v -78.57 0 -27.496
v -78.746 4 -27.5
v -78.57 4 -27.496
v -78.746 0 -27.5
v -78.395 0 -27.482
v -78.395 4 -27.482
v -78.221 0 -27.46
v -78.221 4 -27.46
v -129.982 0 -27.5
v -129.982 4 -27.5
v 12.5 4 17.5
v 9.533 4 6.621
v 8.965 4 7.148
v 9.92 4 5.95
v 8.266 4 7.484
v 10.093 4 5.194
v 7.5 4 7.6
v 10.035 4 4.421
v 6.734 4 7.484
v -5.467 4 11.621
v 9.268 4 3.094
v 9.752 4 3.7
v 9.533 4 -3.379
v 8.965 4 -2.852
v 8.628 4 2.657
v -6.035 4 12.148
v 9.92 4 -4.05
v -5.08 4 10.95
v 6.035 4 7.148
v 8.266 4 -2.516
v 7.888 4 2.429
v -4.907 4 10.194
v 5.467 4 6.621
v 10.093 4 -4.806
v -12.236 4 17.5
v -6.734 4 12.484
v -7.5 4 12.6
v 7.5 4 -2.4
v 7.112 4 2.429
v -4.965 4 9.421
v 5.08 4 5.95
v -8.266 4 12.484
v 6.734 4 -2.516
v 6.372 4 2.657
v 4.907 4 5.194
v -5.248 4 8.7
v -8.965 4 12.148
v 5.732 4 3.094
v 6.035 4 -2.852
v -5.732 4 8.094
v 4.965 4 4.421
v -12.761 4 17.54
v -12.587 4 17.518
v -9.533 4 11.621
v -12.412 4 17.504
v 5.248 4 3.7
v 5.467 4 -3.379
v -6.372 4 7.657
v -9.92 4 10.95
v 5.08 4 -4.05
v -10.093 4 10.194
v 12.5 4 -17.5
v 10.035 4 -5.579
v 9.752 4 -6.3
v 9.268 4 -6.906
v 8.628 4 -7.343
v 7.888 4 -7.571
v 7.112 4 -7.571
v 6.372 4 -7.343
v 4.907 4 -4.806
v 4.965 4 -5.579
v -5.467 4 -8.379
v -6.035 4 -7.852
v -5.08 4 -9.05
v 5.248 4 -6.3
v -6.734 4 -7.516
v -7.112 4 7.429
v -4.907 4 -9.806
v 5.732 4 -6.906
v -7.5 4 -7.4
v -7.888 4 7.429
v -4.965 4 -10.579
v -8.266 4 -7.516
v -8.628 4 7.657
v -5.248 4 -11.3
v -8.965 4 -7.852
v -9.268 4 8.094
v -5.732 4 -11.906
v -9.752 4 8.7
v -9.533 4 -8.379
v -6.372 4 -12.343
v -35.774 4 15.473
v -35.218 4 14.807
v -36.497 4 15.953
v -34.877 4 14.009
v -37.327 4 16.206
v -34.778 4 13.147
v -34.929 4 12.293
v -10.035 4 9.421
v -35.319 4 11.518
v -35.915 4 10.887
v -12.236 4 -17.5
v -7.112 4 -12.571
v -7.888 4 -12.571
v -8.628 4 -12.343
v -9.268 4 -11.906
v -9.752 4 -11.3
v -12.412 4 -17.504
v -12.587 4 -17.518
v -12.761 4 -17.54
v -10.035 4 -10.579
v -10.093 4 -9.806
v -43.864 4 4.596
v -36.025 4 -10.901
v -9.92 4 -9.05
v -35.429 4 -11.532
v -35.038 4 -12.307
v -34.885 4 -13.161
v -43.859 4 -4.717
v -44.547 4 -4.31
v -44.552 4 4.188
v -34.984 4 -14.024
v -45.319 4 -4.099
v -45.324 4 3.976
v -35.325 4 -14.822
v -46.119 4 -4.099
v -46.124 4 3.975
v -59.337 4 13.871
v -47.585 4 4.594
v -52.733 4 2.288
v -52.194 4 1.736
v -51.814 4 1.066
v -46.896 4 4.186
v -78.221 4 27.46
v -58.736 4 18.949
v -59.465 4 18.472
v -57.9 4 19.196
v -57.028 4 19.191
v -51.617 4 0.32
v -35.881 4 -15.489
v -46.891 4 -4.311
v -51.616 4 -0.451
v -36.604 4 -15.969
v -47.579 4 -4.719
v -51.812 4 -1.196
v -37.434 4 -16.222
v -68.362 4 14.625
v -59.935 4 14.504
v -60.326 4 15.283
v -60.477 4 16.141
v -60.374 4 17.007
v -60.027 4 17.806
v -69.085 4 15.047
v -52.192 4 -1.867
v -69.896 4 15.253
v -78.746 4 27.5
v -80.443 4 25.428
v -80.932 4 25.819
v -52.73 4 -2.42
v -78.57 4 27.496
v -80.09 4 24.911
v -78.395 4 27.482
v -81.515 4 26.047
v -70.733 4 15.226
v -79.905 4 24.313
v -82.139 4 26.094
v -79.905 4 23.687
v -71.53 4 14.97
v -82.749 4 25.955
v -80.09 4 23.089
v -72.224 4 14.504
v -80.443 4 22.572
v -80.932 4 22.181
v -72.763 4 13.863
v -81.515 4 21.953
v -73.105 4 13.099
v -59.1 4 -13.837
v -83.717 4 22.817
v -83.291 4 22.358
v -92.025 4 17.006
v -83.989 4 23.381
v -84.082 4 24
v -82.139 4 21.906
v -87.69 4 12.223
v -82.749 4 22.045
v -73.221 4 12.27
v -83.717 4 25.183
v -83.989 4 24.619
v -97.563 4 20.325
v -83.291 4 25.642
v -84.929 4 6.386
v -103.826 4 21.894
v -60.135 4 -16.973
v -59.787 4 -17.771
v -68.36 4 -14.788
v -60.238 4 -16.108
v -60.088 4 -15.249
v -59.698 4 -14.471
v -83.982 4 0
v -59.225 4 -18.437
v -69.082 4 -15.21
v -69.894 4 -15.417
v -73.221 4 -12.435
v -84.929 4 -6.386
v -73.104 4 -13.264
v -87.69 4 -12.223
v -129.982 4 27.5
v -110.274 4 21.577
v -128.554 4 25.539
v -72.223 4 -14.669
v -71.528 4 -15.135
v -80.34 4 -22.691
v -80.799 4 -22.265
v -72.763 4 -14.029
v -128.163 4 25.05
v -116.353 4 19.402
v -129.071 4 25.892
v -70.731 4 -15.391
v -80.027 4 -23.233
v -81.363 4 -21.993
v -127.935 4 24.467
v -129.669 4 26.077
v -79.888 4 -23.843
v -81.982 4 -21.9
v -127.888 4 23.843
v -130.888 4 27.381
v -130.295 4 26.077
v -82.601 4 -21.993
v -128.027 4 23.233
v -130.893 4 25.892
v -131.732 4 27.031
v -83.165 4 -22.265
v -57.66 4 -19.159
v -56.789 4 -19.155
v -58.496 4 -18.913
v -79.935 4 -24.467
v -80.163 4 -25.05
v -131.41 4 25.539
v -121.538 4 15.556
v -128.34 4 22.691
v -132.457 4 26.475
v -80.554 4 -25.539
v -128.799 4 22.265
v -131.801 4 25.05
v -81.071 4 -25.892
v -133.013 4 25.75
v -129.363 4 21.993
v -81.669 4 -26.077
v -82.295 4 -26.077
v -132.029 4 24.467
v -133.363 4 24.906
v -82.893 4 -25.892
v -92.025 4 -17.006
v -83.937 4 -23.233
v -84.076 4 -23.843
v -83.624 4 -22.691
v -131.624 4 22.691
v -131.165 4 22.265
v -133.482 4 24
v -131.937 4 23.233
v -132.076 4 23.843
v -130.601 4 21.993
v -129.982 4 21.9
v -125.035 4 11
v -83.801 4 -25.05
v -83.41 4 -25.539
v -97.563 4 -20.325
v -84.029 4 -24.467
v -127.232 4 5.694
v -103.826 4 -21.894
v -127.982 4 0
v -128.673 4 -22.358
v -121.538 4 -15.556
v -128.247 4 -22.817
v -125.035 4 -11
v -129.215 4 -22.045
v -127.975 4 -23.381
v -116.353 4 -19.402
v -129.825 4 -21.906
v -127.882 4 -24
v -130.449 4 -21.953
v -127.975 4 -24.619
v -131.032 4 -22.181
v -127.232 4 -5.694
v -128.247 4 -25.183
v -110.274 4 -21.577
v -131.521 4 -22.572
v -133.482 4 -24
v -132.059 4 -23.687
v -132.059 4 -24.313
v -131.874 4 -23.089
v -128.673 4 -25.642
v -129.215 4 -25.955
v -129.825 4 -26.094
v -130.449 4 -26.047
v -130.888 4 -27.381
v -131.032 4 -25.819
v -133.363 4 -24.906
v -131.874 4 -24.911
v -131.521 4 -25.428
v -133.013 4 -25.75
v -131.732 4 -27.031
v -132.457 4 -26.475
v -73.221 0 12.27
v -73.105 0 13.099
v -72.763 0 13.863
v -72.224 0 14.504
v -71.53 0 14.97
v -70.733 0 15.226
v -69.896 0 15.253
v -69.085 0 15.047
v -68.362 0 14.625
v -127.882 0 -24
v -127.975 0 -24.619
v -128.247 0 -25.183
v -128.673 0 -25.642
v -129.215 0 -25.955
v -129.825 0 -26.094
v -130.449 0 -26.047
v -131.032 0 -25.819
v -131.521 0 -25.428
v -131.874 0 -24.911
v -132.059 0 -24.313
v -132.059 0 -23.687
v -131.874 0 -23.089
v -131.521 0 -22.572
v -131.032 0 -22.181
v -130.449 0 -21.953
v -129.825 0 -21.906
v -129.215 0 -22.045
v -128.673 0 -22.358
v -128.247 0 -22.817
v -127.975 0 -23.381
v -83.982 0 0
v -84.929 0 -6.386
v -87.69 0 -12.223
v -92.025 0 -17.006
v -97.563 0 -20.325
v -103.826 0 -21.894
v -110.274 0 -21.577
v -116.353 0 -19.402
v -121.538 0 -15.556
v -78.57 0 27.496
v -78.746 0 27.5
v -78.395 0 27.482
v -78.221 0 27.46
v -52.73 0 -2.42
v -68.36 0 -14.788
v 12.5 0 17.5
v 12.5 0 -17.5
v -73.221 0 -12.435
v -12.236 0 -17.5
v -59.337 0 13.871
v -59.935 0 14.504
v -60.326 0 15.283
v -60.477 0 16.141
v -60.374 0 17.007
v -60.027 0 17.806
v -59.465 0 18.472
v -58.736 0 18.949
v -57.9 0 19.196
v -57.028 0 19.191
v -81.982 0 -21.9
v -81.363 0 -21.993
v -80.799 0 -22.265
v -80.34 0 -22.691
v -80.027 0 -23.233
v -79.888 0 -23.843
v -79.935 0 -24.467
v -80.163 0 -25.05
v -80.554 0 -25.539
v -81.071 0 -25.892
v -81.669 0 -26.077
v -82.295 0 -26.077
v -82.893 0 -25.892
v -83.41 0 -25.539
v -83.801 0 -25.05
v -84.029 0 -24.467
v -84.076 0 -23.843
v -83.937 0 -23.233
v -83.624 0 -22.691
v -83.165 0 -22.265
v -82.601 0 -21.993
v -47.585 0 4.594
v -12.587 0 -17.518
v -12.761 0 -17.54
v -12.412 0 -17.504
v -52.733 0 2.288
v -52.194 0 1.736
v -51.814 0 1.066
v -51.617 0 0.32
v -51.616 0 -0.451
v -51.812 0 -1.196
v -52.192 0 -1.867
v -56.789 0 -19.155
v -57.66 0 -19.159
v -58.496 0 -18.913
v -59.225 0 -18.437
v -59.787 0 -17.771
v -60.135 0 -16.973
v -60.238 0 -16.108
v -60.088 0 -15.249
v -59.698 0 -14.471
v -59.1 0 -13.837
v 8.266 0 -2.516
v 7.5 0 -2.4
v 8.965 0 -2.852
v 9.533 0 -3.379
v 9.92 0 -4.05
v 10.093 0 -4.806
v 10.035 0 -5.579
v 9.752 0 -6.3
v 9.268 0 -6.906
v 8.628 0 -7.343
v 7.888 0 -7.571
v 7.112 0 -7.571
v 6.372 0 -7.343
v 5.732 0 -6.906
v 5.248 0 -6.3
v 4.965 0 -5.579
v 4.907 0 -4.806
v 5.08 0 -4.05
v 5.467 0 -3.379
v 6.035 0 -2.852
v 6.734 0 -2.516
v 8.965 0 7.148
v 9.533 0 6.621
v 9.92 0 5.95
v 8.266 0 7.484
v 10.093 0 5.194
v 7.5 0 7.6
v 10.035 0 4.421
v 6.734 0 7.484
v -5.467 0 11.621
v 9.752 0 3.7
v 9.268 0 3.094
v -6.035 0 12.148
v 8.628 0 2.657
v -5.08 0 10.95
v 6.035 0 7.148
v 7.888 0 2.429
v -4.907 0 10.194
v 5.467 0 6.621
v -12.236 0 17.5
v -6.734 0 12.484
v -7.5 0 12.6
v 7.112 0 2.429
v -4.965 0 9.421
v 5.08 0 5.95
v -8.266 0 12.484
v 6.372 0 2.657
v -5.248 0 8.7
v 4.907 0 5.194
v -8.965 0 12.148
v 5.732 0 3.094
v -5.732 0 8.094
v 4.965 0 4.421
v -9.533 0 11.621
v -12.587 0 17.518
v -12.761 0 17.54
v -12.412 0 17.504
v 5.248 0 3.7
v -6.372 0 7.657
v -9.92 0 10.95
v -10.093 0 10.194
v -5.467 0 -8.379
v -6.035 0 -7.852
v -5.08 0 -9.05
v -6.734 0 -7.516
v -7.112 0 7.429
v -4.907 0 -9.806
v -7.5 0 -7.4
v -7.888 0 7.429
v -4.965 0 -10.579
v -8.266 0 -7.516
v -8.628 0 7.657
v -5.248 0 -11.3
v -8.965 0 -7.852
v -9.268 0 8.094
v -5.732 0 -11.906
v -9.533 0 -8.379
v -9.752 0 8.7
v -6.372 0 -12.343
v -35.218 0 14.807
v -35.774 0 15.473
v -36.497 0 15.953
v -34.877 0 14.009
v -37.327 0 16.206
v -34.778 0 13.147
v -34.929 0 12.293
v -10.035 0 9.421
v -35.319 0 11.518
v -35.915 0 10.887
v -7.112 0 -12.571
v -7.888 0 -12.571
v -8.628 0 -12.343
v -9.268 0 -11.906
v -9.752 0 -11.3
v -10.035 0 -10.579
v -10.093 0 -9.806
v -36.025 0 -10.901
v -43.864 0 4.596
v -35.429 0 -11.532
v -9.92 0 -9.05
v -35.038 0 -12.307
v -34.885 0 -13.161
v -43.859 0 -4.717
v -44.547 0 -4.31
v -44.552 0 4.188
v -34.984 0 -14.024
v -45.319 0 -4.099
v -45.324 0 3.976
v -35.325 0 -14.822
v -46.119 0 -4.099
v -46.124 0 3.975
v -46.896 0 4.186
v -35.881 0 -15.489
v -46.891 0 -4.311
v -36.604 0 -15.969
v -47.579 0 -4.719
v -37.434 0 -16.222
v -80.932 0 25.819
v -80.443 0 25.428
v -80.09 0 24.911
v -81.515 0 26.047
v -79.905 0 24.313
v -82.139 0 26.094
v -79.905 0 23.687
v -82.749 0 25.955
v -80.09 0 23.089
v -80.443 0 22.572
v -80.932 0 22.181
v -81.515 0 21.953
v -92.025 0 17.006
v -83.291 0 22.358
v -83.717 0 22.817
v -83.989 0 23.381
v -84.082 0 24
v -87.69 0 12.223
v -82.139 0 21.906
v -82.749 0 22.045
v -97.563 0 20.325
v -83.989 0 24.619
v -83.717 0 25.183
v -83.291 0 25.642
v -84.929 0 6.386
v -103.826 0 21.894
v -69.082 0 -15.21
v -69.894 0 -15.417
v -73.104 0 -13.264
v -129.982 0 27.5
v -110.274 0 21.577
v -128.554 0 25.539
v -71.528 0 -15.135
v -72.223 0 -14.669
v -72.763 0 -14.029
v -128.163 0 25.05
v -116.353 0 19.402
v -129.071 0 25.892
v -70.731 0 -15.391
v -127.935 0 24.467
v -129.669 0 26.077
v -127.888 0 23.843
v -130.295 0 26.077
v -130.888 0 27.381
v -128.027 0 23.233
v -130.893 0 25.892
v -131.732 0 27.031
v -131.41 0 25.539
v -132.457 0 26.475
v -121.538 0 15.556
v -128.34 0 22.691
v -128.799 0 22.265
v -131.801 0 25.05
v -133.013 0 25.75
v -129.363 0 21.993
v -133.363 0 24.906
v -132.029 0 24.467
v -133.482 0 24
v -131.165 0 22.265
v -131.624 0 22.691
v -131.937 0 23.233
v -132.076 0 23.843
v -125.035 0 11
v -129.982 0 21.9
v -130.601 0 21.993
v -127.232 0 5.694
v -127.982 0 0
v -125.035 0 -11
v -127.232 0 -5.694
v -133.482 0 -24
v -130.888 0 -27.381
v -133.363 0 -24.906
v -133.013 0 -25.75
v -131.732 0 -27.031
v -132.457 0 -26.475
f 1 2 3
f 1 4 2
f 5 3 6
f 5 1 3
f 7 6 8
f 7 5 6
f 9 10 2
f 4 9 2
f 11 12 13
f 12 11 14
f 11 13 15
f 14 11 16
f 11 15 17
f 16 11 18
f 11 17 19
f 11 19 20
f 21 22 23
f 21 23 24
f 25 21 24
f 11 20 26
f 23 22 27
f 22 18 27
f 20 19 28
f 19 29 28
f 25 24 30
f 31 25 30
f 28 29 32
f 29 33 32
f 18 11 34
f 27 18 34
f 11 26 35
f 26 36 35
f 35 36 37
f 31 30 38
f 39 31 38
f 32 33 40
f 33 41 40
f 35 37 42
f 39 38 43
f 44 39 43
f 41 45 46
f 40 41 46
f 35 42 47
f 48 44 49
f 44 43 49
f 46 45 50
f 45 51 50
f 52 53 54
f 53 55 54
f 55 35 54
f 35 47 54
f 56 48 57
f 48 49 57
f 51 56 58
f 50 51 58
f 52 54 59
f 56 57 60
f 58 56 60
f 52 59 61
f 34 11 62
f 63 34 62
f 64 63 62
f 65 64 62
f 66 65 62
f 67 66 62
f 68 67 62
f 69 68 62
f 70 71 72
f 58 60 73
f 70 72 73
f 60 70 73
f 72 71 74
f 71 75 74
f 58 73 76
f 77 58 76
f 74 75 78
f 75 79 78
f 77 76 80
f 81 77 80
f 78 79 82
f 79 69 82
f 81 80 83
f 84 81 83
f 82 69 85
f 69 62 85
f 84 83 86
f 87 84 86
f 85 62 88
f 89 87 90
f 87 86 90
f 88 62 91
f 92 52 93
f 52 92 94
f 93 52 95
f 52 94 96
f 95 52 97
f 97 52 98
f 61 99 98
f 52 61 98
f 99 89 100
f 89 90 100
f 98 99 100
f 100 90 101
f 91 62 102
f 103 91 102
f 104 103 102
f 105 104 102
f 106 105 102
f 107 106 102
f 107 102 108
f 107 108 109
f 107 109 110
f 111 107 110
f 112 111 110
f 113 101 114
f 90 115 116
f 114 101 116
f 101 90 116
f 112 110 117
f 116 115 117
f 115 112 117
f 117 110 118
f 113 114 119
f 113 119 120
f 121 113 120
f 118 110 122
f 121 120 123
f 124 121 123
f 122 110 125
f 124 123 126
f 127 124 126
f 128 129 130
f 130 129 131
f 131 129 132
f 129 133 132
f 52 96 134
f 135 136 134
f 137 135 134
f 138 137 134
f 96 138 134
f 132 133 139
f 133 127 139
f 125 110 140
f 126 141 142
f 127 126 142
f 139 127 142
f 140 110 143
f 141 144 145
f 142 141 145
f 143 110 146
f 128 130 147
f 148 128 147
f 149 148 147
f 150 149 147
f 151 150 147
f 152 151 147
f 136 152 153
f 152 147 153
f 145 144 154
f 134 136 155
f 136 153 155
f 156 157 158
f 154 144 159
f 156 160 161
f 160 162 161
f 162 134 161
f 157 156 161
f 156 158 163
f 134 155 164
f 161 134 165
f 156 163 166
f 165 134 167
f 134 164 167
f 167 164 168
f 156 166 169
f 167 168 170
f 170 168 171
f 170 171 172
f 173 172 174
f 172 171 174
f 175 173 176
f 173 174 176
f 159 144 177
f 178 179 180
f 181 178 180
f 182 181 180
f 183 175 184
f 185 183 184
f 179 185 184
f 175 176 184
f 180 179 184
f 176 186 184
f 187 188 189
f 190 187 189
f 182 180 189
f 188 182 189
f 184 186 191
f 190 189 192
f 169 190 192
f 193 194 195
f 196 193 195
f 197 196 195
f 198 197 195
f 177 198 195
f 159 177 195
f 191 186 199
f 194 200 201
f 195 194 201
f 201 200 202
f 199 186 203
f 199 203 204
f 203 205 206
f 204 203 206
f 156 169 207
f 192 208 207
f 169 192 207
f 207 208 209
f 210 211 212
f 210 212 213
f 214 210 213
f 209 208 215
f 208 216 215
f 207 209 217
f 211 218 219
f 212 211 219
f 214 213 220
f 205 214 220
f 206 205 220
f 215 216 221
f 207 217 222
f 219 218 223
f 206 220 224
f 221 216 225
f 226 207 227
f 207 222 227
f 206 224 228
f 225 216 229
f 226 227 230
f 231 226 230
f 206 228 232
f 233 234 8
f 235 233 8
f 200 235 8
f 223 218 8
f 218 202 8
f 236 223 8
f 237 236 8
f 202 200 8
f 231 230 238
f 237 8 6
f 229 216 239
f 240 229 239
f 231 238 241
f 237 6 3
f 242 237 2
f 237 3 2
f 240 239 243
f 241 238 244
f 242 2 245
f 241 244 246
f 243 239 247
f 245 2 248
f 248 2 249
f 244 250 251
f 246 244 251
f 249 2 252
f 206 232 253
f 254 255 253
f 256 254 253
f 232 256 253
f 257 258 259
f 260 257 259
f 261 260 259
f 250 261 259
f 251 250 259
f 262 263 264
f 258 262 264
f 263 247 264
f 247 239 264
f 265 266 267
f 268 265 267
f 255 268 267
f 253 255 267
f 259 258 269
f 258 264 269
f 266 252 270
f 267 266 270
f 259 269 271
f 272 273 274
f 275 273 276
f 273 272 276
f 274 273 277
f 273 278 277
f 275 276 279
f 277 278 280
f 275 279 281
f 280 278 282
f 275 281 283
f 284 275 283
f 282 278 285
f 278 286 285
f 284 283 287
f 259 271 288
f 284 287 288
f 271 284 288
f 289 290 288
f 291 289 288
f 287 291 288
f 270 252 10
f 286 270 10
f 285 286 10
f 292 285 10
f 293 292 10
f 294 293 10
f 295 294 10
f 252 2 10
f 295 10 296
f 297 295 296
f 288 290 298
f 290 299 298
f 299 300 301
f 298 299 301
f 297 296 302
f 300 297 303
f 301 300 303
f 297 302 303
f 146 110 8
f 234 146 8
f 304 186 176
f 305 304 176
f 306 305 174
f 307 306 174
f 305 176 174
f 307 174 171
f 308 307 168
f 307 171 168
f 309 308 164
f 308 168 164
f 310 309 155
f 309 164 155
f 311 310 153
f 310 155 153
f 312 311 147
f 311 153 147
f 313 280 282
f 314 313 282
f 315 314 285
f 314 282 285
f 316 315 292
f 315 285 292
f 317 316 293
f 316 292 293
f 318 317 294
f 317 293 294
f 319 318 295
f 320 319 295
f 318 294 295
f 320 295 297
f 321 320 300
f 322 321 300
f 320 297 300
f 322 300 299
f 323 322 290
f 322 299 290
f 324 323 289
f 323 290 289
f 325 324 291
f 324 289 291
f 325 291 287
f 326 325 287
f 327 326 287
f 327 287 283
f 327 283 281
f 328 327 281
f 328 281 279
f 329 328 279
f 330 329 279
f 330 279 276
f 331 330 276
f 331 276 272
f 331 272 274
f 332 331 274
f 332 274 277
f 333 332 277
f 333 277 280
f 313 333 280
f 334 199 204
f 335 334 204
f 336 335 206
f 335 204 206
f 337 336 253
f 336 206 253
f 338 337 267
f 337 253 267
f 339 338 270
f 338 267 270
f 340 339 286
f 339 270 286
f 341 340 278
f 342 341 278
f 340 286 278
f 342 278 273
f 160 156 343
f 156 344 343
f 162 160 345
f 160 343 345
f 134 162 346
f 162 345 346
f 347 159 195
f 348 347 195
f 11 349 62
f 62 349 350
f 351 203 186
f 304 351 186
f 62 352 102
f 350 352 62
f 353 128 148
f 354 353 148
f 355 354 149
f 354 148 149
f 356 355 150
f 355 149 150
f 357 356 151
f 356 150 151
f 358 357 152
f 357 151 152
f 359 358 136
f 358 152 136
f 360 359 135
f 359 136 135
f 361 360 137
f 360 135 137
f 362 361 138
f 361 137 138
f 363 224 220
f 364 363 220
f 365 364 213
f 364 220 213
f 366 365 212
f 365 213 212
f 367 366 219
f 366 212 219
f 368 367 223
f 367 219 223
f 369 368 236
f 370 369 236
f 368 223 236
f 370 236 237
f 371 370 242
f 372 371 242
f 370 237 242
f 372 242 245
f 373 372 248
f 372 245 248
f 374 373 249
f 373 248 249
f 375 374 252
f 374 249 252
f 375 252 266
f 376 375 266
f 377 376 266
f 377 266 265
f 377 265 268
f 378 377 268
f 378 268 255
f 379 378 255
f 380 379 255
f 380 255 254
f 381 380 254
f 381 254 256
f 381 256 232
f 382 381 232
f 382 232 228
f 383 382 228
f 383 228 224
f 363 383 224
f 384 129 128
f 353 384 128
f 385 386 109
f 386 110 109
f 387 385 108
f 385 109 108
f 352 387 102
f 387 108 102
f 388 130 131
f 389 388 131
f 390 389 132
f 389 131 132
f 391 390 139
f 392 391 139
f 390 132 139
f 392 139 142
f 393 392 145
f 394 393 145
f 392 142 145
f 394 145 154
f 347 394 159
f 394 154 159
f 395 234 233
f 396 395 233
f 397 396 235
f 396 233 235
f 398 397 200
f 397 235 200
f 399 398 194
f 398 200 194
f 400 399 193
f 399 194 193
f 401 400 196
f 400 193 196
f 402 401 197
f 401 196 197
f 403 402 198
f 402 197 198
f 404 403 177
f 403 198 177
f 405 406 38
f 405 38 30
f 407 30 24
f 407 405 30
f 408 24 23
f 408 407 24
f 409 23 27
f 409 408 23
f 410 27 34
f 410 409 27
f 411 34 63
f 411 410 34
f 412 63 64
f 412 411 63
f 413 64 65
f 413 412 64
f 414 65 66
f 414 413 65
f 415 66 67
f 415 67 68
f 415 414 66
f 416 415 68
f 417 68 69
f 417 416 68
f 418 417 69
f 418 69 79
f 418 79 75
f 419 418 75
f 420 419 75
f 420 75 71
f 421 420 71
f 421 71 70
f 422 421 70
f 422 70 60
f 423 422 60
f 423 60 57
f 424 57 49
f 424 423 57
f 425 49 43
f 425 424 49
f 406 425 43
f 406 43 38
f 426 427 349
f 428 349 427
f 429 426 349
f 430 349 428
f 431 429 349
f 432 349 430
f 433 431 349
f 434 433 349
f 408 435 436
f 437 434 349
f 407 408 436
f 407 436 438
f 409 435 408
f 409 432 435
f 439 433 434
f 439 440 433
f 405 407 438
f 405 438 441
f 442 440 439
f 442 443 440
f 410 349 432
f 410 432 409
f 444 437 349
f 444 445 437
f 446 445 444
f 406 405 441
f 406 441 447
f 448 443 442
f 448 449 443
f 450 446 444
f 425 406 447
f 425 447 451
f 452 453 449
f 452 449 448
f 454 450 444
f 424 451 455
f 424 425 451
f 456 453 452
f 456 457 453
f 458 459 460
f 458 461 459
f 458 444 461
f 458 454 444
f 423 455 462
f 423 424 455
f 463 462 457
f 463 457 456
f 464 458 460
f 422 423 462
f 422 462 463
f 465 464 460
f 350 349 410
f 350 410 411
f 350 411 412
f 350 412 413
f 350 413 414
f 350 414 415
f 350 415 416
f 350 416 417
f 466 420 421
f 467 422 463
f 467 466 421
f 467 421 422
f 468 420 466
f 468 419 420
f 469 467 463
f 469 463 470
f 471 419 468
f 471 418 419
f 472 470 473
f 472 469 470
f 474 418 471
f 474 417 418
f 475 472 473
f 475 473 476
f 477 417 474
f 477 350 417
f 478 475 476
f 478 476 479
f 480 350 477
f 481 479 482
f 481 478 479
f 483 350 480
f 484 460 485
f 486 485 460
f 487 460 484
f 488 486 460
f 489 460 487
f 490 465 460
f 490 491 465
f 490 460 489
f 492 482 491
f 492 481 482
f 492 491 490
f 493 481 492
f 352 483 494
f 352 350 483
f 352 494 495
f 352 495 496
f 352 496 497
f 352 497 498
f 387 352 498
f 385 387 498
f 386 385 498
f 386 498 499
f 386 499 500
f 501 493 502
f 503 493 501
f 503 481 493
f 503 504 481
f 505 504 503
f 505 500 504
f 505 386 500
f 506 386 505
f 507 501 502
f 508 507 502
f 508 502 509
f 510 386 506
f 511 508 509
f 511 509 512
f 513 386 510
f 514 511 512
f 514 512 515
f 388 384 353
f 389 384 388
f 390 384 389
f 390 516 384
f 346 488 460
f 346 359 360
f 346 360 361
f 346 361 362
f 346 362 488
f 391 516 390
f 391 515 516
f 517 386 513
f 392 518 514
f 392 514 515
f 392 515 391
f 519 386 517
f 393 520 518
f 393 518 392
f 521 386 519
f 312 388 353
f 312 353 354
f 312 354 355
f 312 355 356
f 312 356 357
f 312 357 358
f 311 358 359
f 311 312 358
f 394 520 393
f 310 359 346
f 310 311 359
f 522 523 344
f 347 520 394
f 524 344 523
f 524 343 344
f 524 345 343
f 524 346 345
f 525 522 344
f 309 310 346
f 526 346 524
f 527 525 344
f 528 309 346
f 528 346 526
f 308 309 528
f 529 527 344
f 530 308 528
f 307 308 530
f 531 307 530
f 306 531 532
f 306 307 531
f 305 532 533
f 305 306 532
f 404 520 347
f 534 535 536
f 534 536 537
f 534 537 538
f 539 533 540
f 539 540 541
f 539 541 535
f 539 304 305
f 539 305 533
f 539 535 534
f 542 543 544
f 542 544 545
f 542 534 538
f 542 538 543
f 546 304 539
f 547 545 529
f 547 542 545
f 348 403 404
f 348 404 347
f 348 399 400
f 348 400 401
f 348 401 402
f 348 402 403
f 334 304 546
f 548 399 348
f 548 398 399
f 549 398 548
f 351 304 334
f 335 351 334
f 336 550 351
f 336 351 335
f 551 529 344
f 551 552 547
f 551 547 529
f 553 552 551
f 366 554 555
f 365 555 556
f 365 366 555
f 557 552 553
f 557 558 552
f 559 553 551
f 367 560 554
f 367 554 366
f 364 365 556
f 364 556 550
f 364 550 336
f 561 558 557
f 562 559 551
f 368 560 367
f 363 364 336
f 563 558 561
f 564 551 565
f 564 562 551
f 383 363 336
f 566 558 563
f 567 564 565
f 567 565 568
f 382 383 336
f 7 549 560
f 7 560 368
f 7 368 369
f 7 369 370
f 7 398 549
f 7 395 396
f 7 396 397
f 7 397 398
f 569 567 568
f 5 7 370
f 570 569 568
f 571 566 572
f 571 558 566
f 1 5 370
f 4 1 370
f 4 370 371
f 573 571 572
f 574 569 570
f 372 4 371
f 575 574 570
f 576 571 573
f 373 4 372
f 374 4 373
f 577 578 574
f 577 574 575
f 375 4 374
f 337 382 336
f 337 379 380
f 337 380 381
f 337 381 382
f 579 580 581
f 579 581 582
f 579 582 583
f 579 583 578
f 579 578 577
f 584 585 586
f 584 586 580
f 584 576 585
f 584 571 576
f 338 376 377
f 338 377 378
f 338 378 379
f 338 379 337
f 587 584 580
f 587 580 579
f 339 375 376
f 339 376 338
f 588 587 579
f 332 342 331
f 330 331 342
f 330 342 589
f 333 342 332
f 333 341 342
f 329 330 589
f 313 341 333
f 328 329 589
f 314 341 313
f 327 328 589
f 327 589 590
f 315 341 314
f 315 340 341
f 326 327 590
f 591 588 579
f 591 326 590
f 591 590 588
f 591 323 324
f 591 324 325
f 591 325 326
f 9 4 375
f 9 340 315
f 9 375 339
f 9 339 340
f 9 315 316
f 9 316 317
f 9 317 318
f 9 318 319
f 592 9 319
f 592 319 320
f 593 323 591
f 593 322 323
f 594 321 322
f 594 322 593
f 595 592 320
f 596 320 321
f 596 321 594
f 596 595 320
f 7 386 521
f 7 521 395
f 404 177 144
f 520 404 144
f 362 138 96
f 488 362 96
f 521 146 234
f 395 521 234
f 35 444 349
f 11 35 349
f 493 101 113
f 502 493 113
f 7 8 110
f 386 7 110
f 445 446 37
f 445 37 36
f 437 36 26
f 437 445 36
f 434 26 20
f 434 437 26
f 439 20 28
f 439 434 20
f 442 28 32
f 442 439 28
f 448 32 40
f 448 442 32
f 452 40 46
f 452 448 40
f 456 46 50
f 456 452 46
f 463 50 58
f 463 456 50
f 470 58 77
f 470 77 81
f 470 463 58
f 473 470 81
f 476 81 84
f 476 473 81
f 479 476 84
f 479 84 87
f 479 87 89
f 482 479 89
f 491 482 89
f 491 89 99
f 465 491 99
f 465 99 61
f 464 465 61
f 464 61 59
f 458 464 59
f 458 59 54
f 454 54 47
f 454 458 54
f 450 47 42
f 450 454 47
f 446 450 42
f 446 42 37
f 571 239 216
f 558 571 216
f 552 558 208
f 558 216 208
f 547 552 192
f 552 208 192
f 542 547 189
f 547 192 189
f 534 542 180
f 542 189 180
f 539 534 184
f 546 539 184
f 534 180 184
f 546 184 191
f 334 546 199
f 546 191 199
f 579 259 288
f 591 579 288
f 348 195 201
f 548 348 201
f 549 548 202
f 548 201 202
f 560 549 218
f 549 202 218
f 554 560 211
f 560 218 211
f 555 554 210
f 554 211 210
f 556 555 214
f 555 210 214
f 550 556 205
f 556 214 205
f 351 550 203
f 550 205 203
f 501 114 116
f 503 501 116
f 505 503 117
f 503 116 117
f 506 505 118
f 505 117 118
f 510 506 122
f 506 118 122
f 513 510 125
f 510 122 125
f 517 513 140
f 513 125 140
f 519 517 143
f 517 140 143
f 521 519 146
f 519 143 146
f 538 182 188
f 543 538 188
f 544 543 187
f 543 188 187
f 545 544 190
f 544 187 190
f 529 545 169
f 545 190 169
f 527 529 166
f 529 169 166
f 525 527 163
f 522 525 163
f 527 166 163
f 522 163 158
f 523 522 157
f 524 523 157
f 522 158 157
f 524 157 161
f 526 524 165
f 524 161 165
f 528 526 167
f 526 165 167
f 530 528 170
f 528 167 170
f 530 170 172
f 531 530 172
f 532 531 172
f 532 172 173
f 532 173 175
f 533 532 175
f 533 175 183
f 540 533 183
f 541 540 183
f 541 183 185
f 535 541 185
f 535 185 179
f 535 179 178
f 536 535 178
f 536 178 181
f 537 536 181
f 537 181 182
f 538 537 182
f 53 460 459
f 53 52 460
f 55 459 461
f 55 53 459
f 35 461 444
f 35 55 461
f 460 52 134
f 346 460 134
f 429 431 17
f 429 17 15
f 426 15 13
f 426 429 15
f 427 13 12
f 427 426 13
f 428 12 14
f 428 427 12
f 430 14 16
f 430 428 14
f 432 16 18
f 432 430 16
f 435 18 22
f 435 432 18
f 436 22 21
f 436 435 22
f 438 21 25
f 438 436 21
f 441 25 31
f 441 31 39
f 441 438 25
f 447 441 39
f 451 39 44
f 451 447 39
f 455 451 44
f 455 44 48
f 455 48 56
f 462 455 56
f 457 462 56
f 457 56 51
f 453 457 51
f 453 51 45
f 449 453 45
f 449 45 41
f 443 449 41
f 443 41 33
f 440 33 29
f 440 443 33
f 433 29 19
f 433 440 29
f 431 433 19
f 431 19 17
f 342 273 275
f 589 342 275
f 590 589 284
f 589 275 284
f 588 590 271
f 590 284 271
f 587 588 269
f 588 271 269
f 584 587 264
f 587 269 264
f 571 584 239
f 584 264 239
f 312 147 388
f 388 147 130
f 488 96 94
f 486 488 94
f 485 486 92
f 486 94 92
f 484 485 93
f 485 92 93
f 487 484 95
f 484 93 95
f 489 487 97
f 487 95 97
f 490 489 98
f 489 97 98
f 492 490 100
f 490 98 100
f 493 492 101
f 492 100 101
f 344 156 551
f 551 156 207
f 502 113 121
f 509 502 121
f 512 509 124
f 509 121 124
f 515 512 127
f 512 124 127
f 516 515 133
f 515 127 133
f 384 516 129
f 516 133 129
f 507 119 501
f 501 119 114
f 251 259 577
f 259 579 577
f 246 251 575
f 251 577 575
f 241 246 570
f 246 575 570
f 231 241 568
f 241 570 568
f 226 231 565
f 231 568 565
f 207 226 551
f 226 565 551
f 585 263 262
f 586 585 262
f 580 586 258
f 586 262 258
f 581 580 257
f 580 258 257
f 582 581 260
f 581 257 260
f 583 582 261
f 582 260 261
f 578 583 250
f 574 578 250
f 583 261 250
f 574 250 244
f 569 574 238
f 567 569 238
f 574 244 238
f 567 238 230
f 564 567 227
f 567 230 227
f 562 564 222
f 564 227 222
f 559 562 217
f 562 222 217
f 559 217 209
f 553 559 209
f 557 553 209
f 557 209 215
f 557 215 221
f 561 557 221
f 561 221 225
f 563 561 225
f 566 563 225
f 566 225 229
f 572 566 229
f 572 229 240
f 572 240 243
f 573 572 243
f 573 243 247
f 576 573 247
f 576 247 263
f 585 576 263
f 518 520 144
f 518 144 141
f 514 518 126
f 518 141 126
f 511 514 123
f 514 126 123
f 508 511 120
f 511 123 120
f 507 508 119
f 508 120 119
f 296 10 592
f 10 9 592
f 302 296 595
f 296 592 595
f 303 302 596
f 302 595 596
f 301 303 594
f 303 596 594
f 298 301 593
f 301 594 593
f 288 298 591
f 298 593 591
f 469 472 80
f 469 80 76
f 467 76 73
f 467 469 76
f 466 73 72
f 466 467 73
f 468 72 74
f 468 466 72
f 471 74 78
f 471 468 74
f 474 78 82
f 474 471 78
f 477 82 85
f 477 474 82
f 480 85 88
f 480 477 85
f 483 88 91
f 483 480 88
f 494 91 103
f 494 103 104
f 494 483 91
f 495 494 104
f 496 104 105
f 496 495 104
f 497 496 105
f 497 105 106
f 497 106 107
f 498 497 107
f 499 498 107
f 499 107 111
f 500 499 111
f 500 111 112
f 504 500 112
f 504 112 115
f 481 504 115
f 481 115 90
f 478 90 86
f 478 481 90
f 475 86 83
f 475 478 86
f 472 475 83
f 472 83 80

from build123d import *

# Parameters (mm, degrees)
SKETCH_1_W               = 25
SKETCH_1_H               = 35
SKETCH_1_R               = 2.6
EXTRUDE_1_DEPTH          = 4
EXTRUDE_2_DEPTH          = 4
FILLET_1_R               = 3.5
CUT_EXTRUDE_1_DEPTH      = 10
SKETCH_4_R               = 2.1
CUT_EXTRUDE_2_DEPTH      = 10
PATTERN_CIRCULAR_1_COUNT = 4
CUT_EXTRUDE_3_DEPTH      = 163


with BuildPart() as part:
    # 草图1 → 凸台-拉伸1 (new body)
    with BuildSketch(Plane(origin=(0, 0, 0), x_dir=(1, 0, 0), z_dir=(0, 1, 0))):
        Rectangle(SKETCH_1_W, SKETCH_1_H)
        with Locations(Location((7.5, 5, 0), (0, 0, 270))):
            Circle(SKETCH_1_R, mode=Mode.SUBTRACT)
        with Locations(Location((7.5, -5, 0), (0, 0, 270))):
            Circle(SKETCH_1_R, mode=Mode.SUBTRACT)
        with Locations(Location((-7.5, -10, 0), (0, 0, 270))):
            Circle(SKETCH_1_R, mode=Mode.SUBTRACT)
        with Locations(Location((-7.5, 10, 0), (0, 0, 270))):
            Circle(SKETCH_1_R, mode=Mode.SUBTRACT)
    extrude(amount=EXTRUDE_1_DEPTH)


with BuildPart() as body_2:
    # 草图2 → 凸台-拉伸2 (new body)
    with BuildSketch(Plane(origin=(0, 4, 0), x_dir=(1, 0, 0), z_dir=(0, 1, 0))):
        Polygon((-133.482, 27.5), (-78.482, 27.5), (-12.5, 17.5), (-12.5, -17.5), (-78.482, -27.5), (-133.482, -27.5), align=None)
    extrude(amount=-EXTRUDE_2_DEPTH)


with BuildPart() as part_1:
    add(part.part)

    # Combine 1: union body 2
    add(body_2.part)

    # 圆角1
    fillet_1_edges = [part_1.edges().sort_by_distance(p)[0] for p in [
        (-12.5, 2, -17.5),
        (-12.5, 2, 17.5),
        (-78.482, 2, 27.5),
        (-133.482, 2, 27.5),
        (-133.482, 2, -27.5),
        (-78.482, 2, -27.5),
    ]]
    fillet(fillet_1_edges, radius=FILLET_1_R)

    # 草图3 → 切除-拉伸1 (cut)
    with BuildSketch(Plane(origin=(0, 4, 0), x_dir=(1, 0, 0), z_dir=(0, 1, 0))):
        with BuildLine():
            ThreePointArc((-83.982, 0), (-97.562964488, 20.325349715), (-121.538349186, 15.556349186))
            Line((-121.538349186, 15.556349186), (-105.982, 0))
            Line((-105.982, 0), (-121.538349186, -15.556349186))
            ThreePointArc((-121.538349186, -15.556349186), (-97.562964488, -20.325349715), (-83.982, 0))
        make_face()
        with BuildLine():
            Line((-105.982, 0), (-121.538349186, 15.556349186))
            ThreePointArc((-121.538349186, 15.556349186), (-127.982, 0), (-121.538349186, -15.556349186))
            Line((-121.538349186, -15.556349186), (-105.982, 0))
        make_face()
    extrude(amount=-CUT_EXTRUDE_1_DEPTH, mode=Mode.SUBTRACT)

    # 草图4 → 切除-拉伸2 (cut)
    with BuildSketch(Plane(origin=(0, 4, 0), x_dir=(1, 0, 0), z_dir=(0, 1, 0))):
        with Locations(Location((-81.982, 24, 0), (0, 0, 270))):
            Circle(SKETCH_4_R)
    cut_extrude_2 = extrude(amount=-CUT_EXTRUDE_2_DEPTH, mode=Mode.SUBTRACT)

    # 阵列(圆周)1: 切除-拉伸2 ×4 about axis
    pattern_circular_1_axis = Axis((-105.982, 0, 0), (0, 1, 0))
    for i in range(1, PATTERN_CIRCULAR_1_COUNT):
        add(cut_extrude_2.rotate(pattern_circular_1_axis, i * 360 / PATTERN_CIRCULAR_1_COUNT), mode=Mode.SUBTRACT)

    # 草图5 → 切除-拉伸3 (cut)
    with BuildSketch(Plane(origin=(0, 82, 0), x_dir=(1, 0, 0), z_dir=(0, 1, 0))):
        with BuildLine():
            Line((-43.858652951, 4.717262465), (-36.024929121, 10.900937766))
            ThreePointArc((-36.024929121, 10.900937766), (-34.983693556, 14.023777786), (-37.434169796, 16.221837724))
            Line((-37.434169796, 16.221837724), (-56.789222754, 19.155221519))
            ThreePointArc((-56.789222754, 19.155221519), (-59.99021825, 17.384697858), (-59.100366311, 13.836558948))
            Line((-59.100366311, 13.836558948), (-47.579037182, 4.719499851))
            ThreePointArc((-47.579037182, 4.719499851), (-45.71923377, 4.072034614), (-43.858652951, 4.717262465))
        make_face()
        with BuildLine():
            Line((-35.914624614, -10.886886831), (-43.864253928, -4.59618552))
            ThreePointArc((-43.864253928, -4.59618552), (-45.72405734, -3.948720283), (-47.584638159, -4.593948133))
            Line((-47.584638159, -4.593948133), (-59.336609443, -13.870554782))
            ThreePointArc((-59.336609443, -13.870554782), (-60.230010812, -17.419276174), (-57.028296794, -19.191454741))
            Line((-57.028296794, -19.191454741), (-37.326696195, -16.205549403))
            ThreePointArc((-37.326696195, -16.205549403), (-34.876682386, -14.009233352), (-35.914624614, -10.886886831))
        make_face()
        with BuildLine():
            Line((-68.362482774, -14.625227843), (-52.732917259, -2.287780119))
            ThreePointArc((-52.732917259, -2.287780119), (-51.591694463, 0.065187331), (-52.730086351, 2.419525709))
            Line((-52.730086351, 2.419525709), (-68.359651866, 14.787514754))
            ThreePointArc((-68.359651866, 14.787514754), (-71.528006789, 15.135427044), (-73.221259435, 12.434980533))
            Line((-73.221259435, 12.434980533), (-73.221259435, -12.270456236))
            ThreePointArc((-73.221259435, -12.270456236), (-71.529630563, -14.970116398), (-68.362482774, -14.625227843))
        make_face()
    extrude(amount=-CUT_EXTRUDE_3_DEPTH, mode=Mode.SUBTRACT)


solid = part_1.part
